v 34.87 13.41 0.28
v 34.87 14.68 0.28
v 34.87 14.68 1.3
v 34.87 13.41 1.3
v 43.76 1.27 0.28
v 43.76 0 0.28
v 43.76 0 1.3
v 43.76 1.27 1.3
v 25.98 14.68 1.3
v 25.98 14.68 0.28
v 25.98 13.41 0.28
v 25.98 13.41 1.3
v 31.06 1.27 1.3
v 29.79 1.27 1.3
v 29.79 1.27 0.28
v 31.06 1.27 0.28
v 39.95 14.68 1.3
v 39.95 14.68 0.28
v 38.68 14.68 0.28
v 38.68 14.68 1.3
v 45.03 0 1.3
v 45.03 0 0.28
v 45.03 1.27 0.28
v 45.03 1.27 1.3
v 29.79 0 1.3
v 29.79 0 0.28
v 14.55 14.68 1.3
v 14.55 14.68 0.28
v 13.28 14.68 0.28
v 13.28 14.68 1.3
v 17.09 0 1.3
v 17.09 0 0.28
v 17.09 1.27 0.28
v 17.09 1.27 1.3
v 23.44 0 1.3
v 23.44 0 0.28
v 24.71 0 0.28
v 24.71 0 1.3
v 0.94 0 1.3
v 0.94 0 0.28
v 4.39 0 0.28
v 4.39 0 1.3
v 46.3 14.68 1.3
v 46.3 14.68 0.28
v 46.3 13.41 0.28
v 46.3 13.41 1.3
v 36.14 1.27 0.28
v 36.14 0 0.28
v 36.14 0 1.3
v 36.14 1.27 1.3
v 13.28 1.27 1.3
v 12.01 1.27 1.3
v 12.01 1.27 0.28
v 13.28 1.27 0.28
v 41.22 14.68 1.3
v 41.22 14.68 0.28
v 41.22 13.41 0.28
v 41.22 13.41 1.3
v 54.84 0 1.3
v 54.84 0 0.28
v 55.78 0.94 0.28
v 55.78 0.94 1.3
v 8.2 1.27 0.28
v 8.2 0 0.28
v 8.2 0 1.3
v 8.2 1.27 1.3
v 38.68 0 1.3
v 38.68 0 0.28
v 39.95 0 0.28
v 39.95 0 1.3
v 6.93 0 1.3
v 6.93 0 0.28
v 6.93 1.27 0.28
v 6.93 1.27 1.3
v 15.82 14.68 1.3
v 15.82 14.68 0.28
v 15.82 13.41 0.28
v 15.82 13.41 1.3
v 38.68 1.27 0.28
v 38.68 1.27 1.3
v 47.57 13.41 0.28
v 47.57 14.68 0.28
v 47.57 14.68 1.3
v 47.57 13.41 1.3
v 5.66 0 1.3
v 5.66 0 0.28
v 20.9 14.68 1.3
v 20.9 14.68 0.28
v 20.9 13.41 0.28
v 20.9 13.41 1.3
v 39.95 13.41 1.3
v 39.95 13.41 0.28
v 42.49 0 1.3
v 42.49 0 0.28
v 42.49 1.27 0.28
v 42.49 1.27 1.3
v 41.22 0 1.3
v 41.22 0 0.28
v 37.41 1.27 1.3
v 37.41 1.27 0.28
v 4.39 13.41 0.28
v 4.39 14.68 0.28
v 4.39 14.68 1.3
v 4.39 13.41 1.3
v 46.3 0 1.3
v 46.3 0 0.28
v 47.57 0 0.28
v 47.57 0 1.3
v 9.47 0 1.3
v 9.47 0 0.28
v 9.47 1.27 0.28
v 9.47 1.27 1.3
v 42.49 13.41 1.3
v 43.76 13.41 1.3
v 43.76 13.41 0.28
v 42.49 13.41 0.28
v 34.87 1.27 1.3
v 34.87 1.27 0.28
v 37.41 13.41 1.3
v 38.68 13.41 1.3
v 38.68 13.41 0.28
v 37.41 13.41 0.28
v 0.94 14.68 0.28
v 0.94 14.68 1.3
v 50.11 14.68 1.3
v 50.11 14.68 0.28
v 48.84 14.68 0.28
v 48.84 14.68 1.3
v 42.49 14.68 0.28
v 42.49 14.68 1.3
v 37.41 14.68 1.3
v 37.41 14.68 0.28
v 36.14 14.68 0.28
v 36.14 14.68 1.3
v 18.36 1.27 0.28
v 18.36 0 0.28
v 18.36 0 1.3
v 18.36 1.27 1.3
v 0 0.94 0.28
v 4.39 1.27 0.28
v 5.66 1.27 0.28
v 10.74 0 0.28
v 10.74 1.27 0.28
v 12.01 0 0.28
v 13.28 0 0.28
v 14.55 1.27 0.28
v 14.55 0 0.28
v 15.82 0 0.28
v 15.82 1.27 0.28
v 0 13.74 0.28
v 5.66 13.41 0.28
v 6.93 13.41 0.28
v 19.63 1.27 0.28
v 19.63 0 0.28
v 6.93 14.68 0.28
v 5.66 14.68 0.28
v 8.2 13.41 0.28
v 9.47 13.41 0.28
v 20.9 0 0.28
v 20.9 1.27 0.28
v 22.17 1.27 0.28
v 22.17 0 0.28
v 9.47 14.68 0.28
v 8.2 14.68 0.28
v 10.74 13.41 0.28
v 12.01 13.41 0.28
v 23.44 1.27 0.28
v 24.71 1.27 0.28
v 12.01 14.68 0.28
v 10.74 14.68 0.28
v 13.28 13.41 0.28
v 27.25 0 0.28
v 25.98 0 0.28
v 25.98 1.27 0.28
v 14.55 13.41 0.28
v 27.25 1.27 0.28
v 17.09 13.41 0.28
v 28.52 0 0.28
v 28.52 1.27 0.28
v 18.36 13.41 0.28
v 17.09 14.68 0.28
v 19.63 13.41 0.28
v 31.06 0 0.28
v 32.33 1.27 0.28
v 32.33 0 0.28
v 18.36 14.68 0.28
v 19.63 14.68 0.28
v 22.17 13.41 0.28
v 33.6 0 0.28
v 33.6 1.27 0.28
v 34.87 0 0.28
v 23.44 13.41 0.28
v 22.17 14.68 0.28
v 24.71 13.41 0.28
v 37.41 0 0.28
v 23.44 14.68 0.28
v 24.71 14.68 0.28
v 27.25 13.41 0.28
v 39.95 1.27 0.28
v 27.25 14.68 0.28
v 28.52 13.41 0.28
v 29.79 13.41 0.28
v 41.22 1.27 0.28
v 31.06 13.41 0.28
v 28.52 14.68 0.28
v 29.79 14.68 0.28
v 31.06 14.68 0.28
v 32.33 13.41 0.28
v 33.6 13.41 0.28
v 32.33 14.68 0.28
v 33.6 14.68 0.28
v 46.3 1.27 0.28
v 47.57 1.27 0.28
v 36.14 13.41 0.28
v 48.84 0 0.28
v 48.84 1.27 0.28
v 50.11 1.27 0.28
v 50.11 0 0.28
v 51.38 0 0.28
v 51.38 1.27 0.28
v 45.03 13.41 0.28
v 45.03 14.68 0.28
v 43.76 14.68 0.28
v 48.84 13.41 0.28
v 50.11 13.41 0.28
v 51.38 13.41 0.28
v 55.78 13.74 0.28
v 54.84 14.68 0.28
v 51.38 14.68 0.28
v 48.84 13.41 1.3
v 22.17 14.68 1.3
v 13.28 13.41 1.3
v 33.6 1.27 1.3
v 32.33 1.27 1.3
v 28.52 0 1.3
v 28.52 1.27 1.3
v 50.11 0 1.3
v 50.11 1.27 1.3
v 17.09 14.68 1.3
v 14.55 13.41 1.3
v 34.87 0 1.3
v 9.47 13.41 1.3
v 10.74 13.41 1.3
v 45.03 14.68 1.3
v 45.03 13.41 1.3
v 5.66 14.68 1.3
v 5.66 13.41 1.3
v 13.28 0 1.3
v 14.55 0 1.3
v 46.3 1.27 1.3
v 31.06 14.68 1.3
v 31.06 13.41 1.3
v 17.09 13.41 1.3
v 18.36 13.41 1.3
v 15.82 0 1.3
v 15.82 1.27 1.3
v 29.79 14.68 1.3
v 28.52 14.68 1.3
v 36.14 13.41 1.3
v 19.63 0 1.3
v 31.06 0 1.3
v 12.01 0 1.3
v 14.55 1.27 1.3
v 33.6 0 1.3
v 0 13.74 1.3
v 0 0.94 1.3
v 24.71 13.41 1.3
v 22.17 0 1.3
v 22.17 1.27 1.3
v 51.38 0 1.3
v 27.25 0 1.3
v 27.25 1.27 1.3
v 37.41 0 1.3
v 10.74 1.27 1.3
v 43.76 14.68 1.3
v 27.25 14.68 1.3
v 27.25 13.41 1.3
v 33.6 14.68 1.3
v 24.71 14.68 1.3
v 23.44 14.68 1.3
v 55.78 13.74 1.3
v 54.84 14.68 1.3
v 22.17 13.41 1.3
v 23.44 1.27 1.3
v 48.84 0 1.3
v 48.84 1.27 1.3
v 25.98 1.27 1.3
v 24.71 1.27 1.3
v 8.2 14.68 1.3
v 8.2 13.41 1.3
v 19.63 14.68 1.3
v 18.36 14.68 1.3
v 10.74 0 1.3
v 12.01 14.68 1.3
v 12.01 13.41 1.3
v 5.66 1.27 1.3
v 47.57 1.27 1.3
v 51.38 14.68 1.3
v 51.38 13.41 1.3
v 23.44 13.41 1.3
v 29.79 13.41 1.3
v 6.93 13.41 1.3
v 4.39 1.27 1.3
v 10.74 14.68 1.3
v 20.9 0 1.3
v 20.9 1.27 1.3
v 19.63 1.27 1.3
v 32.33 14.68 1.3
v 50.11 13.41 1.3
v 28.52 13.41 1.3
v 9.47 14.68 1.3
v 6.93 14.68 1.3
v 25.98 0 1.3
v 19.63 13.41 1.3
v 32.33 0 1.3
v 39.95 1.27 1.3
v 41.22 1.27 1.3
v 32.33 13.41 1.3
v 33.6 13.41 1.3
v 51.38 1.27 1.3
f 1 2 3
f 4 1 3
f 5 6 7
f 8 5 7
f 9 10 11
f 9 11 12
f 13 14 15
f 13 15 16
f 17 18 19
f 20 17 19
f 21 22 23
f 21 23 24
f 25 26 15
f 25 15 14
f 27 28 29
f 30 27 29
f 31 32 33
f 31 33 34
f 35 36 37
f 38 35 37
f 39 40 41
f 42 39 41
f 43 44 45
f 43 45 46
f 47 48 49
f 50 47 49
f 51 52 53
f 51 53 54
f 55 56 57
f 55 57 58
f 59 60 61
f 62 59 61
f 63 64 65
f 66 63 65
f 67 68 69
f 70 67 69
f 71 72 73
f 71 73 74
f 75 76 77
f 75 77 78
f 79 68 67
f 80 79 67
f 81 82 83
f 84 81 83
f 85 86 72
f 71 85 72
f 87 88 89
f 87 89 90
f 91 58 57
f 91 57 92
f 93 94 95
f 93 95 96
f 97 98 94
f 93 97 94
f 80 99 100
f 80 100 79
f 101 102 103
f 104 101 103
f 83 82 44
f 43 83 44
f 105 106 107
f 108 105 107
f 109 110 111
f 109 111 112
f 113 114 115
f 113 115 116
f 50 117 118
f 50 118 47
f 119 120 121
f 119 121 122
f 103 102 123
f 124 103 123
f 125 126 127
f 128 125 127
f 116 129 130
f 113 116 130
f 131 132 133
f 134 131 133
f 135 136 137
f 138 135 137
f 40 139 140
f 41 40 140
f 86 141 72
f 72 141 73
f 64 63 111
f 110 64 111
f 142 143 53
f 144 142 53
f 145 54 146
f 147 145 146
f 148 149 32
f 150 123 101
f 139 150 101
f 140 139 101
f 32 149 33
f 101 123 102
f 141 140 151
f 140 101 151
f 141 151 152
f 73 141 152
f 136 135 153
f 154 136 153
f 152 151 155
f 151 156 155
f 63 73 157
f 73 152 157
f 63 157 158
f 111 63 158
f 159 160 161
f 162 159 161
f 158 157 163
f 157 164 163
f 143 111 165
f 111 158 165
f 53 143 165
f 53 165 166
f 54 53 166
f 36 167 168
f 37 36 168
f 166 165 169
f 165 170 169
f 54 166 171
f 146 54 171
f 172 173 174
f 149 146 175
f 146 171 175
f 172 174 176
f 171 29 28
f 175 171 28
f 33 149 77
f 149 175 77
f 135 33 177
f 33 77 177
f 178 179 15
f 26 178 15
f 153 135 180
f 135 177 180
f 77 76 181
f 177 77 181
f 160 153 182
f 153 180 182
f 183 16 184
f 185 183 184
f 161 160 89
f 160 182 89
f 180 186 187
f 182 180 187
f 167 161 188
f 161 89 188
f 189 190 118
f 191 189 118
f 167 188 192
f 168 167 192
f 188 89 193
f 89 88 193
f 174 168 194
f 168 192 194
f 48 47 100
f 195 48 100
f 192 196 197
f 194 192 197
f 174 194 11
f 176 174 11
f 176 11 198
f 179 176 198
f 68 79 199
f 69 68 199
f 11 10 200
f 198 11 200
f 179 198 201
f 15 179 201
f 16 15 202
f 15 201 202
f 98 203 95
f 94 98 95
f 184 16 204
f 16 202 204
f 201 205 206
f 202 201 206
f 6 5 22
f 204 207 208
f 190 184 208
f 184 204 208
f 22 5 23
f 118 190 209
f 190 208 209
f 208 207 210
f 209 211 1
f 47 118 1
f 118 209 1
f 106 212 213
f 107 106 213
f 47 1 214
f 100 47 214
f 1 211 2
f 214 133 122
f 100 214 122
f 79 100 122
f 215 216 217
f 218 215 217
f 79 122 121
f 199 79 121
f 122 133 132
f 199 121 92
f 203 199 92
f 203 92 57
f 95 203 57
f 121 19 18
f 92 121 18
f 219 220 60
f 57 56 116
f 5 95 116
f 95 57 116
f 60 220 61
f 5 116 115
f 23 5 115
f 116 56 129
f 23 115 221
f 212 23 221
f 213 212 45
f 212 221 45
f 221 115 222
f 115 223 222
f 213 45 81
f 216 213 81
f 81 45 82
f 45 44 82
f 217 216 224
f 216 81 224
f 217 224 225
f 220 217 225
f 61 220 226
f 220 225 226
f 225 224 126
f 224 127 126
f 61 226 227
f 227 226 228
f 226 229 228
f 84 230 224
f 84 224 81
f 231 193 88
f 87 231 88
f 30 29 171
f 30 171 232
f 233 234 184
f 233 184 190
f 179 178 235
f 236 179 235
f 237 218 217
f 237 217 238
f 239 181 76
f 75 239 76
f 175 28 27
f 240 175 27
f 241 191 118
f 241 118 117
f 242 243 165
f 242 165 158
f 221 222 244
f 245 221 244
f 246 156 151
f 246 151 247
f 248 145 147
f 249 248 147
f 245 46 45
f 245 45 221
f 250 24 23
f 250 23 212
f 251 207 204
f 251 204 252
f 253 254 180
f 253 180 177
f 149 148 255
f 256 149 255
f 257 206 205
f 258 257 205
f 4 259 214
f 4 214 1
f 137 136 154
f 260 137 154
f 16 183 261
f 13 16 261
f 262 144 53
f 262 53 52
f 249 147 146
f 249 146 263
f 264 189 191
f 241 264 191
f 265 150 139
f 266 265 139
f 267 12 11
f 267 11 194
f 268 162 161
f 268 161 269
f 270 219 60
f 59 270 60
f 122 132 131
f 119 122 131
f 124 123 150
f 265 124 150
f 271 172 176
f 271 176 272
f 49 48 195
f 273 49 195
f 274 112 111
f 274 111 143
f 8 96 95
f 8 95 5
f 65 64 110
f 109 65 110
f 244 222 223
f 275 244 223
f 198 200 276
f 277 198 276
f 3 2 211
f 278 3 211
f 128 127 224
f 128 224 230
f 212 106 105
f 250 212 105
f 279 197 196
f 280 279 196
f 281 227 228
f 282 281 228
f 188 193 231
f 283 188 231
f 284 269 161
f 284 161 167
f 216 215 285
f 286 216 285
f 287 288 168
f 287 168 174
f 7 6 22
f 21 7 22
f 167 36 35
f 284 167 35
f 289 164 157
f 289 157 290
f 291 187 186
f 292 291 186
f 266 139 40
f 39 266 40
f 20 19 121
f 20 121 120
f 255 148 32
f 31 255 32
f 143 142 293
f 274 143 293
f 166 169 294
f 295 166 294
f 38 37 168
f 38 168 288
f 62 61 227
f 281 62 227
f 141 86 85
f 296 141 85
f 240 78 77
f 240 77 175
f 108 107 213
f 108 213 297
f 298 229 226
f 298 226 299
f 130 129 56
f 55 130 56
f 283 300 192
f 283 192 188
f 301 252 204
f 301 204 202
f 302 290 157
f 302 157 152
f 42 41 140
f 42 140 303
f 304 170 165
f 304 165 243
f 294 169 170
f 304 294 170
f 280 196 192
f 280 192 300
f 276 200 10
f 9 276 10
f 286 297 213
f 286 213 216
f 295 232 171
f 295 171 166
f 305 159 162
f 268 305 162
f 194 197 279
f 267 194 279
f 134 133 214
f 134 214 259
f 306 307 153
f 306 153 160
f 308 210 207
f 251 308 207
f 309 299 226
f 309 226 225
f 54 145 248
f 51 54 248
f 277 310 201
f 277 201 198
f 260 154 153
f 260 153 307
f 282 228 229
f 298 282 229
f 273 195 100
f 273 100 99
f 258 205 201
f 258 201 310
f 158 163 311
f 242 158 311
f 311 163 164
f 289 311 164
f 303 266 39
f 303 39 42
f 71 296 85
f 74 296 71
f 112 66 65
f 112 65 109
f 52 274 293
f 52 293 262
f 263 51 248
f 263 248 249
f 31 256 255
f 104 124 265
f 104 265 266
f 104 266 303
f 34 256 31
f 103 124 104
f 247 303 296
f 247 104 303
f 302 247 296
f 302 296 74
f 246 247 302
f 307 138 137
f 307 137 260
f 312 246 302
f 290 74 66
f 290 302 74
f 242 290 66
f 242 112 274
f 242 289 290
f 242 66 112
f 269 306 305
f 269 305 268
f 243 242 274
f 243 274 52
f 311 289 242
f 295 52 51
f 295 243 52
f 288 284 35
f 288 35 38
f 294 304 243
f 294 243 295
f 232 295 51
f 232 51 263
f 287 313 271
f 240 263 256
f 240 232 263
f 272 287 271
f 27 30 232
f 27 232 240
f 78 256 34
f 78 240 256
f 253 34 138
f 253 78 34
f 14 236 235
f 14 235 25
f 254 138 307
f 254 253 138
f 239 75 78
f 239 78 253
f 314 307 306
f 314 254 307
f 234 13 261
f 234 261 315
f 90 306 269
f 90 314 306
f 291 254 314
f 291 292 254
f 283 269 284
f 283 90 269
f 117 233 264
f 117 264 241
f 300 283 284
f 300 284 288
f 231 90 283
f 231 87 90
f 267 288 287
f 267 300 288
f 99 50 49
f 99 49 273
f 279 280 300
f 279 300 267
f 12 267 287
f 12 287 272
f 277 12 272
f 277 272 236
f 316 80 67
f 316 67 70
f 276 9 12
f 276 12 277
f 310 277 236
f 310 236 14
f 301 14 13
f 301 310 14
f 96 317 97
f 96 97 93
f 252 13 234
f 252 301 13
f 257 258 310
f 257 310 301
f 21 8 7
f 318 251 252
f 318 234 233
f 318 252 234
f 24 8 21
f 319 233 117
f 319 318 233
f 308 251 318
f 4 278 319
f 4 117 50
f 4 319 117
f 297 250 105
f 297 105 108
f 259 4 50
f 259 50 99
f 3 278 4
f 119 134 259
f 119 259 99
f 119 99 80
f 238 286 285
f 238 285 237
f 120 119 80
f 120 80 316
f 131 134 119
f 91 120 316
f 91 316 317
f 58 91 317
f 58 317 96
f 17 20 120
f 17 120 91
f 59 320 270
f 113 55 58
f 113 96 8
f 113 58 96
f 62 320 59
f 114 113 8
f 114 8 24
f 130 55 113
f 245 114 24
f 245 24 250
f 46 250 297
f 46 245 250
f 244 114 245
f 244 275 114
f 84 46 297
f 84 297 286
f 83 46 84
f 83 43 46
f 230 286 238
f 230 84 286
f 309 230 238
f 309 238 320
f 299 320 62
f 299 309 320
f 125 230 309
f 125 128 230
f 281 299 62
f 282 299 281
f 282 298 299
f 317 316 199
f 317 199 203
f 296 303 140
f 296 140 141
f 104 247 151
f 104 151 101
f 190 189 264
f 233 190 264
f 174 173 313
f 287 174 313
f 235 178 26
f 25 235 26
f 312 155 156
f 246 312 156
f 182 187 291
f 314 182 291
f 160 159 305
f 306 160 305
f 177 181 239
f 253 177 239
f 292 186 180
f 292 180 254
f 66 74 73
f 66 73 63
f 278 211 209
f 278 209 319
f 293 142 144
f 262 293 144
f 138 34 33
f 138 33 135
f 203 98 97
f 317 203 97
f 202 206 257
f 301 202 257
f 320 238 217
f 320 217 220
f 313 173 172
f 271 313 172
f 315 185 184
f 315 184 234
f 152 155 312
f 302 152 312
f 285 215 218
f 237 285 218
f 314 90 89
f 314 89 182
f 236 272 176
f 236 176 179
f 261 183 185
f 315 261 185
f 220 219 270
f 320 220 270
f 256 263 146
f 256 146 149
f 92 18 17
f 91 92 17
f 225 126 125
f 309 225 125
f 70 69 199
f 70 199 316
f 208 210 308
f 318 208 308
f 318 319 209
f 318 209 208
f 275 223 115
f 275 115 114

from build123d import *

# Parameters (mm, degrees)
PAD_DEPTH       = 1.02
SKETCH001_W     = 1.27
SKETCH001_H     = 1.07
POCKET_DEPTH    = 1.27
SKETCH002_W     = 1.27
SKETCH002_H     = 1.07
POCKET001_DEPTH = 1.27


with BuildPart() as part:
    # Sketch → Pad (new body)
    with BuildSketch(Plane.XY.offset(0.28)):
        Polygon((0, 0.94), (0.94, 0), (54.84, 0), (55.78, 0.94), (55.78, 13.74), (54.84, 14.68), (0.94, 14.68), (0, 13.74), align=None)
    extrude(amount=PAD_DEPTH)

    # Sketch001 → Pocket (cut)
    with BuildSketch(Plane(origin=(0, 0, 0.28), x_dir=(1, 0, 0), z_dir=(0, -1, 0))):
        with Locations((5.025, 0.535)):
            Rectangle(SKETCH001_W, SKETCH001_H)
        with Locations((7.565, 0.535)):
            Rectangle(SKETCH001_W, SKETCH001_H)
        with Locations((10.105, 0.535)):
            Rectangle(SKETCH001_W, SKETCH001_H)
        with Locations((12.644979, 0.52763)):
            Rectangle(SKETCH001_W, SKETCH001_H)
        with Locations((15.184957, 0.535)):
            Rectangle(SKETCH001_W, SKETCH001_H)
        with Locations((17.724957, 0.535)):
            Rectangle(SKETCH001_W, SKETCH001_H)
        with Locations((20.264957, 0.535)):
            Rectangle(SKETCH001_W, SKETCH001_H)
        with Locations((22.804957, 0.535)):
            Rectangle(SKETCH001_W, SKETCH001_H)
        with Locations((25.344957, 0.535)):
            Rectangle(SKETCH001_W, SKETCH001_H)
        with Locations((27.884957, 0.535)):
            Rectangle(SKETCH001_W, SKETCH001_H)
        with Locations((30.424957, 0.535)):
            Rectangle(SKETCH001_W, SKETCH001_H)
        with Locations((32.964957, 0.535)):
            Rectangle(SKETCH001_W, SKETCH001_H)
        with Locations((35.504957, 0.535)):
            Rectangle(SKETCH001_W, SKETCH001_H)
        with Locations((38.044957, 0.535)):
            Rectangle(SKETCH001_W, SKETCH001_H)
        with Locations((40.584957, 0.535)):
            Rectangle(SKETCH001_W, SKETCH001_H)
        with Locations((43.124957, 0.535)):
            Rectangle(SKETCH001_W, SKETCH001_H)
        with Locations((45.664957, 0.535)):
            Rectangle(SKETCH001_W, SKETCH001_H)
        with Locations((48.204957, 0.535)):
            Rectangle(SKETCH001_W, SKETCH001_H)
        with Locations((50.744957, 0.535)):
            Rectangle(SKETCH001_W, SKETCH001_H)
    extrude(amount=-POCKET_DEPTH, mode=Mode.SUBTRACT)

    # Sketch002 → Pocket001 (cut)
    with BuildSketch(Plane(origin=(0, 14.68, 0.28), x_dir=(-1, 0, 0), z_dir=(0, 1, 0))):
        with Locations((-45.665, 0.535)):
            Rectangle(SKETCH002_W, SKETCH002_H)
        with Locations((-43.125, 0.535)):
            Rectangle(SKETCH002_W, SKETCH002_H)
        with Locations((-40.585, 0.535)):
            Rectangle(SKETCH002_W, SKETCH002_H)
        with Locations((-40.585, 0.535)):
            Rectangle(SKETCH002_W, SKETCH002_H)
        with Locations((-40.585, 0.535)):
            Rectangle(SKETCH002_W, SKETCH002_H)
        with Locations((-38.045, 0.535)):
            Rectangle(SKETCH002_W, SKETCH002_H)
        with Locations((-35.505, 0.535)):
            Rectangle(SKETCH002_W, SKETCH002_H)
        with Locations((-32.965, 0.535)):
            Rectangle(SKETCH002_W, SKETCH002_H)
        with Locations((-30.425, 0.535)):
            Rectangle(SKETCH002_W, SKETCH002_H)
        with Locations((-27.885, 0.535)):
            Rectangle(SKETCH002_W, SKETCH002_H)
        with Locations((-25.345, 0.535)):
            Rectangle(SKETCH002_W, SKETCH002_H)
        with Locations((-22.805, 0.535)):
            Rectangle(SKETCH002_W, SKETCH002_H)
        with Locations((-20.265, 0.535)):
            Rectangle(SKETCH002_W, SKETCH002_H)
        with Locations((-17.725, 0.535)):
            Rectangle(SKETCH002_W, SKETCH002_H)
        with Locations((-15.185, 0.535)):
            Rectangle(SKETCH002_W, SKETCH002_H)
        with Locations((-12.645, 0.535)):
            Rectangle(SKETCH002_W, SKETCH002_H)
        with Locations((-10.105, 0.535)):
            Rectangle(SKETCH002_W, SKETCH002_H)
        with Locations((-7.565, 0.535)):
            Rectangle(SKETCH002_W, SKETCH002_H)
        with Locations((-5.025, 0.535)):
            Rectangle(SKETCH002_W, SKETCH002_H)
        with Locations((-48.205, 0.535)):
            Rectangle(SKETCH002_W, SKETCH002_H)
        with Locations((-50.745, 0.535)):
            Rectangle(SKETCH002_W, SKETCH002_H)
    extrude(amount=-POCKET001_DEPTH, mode=Mode.SUBTRACT)


solid = part.part
